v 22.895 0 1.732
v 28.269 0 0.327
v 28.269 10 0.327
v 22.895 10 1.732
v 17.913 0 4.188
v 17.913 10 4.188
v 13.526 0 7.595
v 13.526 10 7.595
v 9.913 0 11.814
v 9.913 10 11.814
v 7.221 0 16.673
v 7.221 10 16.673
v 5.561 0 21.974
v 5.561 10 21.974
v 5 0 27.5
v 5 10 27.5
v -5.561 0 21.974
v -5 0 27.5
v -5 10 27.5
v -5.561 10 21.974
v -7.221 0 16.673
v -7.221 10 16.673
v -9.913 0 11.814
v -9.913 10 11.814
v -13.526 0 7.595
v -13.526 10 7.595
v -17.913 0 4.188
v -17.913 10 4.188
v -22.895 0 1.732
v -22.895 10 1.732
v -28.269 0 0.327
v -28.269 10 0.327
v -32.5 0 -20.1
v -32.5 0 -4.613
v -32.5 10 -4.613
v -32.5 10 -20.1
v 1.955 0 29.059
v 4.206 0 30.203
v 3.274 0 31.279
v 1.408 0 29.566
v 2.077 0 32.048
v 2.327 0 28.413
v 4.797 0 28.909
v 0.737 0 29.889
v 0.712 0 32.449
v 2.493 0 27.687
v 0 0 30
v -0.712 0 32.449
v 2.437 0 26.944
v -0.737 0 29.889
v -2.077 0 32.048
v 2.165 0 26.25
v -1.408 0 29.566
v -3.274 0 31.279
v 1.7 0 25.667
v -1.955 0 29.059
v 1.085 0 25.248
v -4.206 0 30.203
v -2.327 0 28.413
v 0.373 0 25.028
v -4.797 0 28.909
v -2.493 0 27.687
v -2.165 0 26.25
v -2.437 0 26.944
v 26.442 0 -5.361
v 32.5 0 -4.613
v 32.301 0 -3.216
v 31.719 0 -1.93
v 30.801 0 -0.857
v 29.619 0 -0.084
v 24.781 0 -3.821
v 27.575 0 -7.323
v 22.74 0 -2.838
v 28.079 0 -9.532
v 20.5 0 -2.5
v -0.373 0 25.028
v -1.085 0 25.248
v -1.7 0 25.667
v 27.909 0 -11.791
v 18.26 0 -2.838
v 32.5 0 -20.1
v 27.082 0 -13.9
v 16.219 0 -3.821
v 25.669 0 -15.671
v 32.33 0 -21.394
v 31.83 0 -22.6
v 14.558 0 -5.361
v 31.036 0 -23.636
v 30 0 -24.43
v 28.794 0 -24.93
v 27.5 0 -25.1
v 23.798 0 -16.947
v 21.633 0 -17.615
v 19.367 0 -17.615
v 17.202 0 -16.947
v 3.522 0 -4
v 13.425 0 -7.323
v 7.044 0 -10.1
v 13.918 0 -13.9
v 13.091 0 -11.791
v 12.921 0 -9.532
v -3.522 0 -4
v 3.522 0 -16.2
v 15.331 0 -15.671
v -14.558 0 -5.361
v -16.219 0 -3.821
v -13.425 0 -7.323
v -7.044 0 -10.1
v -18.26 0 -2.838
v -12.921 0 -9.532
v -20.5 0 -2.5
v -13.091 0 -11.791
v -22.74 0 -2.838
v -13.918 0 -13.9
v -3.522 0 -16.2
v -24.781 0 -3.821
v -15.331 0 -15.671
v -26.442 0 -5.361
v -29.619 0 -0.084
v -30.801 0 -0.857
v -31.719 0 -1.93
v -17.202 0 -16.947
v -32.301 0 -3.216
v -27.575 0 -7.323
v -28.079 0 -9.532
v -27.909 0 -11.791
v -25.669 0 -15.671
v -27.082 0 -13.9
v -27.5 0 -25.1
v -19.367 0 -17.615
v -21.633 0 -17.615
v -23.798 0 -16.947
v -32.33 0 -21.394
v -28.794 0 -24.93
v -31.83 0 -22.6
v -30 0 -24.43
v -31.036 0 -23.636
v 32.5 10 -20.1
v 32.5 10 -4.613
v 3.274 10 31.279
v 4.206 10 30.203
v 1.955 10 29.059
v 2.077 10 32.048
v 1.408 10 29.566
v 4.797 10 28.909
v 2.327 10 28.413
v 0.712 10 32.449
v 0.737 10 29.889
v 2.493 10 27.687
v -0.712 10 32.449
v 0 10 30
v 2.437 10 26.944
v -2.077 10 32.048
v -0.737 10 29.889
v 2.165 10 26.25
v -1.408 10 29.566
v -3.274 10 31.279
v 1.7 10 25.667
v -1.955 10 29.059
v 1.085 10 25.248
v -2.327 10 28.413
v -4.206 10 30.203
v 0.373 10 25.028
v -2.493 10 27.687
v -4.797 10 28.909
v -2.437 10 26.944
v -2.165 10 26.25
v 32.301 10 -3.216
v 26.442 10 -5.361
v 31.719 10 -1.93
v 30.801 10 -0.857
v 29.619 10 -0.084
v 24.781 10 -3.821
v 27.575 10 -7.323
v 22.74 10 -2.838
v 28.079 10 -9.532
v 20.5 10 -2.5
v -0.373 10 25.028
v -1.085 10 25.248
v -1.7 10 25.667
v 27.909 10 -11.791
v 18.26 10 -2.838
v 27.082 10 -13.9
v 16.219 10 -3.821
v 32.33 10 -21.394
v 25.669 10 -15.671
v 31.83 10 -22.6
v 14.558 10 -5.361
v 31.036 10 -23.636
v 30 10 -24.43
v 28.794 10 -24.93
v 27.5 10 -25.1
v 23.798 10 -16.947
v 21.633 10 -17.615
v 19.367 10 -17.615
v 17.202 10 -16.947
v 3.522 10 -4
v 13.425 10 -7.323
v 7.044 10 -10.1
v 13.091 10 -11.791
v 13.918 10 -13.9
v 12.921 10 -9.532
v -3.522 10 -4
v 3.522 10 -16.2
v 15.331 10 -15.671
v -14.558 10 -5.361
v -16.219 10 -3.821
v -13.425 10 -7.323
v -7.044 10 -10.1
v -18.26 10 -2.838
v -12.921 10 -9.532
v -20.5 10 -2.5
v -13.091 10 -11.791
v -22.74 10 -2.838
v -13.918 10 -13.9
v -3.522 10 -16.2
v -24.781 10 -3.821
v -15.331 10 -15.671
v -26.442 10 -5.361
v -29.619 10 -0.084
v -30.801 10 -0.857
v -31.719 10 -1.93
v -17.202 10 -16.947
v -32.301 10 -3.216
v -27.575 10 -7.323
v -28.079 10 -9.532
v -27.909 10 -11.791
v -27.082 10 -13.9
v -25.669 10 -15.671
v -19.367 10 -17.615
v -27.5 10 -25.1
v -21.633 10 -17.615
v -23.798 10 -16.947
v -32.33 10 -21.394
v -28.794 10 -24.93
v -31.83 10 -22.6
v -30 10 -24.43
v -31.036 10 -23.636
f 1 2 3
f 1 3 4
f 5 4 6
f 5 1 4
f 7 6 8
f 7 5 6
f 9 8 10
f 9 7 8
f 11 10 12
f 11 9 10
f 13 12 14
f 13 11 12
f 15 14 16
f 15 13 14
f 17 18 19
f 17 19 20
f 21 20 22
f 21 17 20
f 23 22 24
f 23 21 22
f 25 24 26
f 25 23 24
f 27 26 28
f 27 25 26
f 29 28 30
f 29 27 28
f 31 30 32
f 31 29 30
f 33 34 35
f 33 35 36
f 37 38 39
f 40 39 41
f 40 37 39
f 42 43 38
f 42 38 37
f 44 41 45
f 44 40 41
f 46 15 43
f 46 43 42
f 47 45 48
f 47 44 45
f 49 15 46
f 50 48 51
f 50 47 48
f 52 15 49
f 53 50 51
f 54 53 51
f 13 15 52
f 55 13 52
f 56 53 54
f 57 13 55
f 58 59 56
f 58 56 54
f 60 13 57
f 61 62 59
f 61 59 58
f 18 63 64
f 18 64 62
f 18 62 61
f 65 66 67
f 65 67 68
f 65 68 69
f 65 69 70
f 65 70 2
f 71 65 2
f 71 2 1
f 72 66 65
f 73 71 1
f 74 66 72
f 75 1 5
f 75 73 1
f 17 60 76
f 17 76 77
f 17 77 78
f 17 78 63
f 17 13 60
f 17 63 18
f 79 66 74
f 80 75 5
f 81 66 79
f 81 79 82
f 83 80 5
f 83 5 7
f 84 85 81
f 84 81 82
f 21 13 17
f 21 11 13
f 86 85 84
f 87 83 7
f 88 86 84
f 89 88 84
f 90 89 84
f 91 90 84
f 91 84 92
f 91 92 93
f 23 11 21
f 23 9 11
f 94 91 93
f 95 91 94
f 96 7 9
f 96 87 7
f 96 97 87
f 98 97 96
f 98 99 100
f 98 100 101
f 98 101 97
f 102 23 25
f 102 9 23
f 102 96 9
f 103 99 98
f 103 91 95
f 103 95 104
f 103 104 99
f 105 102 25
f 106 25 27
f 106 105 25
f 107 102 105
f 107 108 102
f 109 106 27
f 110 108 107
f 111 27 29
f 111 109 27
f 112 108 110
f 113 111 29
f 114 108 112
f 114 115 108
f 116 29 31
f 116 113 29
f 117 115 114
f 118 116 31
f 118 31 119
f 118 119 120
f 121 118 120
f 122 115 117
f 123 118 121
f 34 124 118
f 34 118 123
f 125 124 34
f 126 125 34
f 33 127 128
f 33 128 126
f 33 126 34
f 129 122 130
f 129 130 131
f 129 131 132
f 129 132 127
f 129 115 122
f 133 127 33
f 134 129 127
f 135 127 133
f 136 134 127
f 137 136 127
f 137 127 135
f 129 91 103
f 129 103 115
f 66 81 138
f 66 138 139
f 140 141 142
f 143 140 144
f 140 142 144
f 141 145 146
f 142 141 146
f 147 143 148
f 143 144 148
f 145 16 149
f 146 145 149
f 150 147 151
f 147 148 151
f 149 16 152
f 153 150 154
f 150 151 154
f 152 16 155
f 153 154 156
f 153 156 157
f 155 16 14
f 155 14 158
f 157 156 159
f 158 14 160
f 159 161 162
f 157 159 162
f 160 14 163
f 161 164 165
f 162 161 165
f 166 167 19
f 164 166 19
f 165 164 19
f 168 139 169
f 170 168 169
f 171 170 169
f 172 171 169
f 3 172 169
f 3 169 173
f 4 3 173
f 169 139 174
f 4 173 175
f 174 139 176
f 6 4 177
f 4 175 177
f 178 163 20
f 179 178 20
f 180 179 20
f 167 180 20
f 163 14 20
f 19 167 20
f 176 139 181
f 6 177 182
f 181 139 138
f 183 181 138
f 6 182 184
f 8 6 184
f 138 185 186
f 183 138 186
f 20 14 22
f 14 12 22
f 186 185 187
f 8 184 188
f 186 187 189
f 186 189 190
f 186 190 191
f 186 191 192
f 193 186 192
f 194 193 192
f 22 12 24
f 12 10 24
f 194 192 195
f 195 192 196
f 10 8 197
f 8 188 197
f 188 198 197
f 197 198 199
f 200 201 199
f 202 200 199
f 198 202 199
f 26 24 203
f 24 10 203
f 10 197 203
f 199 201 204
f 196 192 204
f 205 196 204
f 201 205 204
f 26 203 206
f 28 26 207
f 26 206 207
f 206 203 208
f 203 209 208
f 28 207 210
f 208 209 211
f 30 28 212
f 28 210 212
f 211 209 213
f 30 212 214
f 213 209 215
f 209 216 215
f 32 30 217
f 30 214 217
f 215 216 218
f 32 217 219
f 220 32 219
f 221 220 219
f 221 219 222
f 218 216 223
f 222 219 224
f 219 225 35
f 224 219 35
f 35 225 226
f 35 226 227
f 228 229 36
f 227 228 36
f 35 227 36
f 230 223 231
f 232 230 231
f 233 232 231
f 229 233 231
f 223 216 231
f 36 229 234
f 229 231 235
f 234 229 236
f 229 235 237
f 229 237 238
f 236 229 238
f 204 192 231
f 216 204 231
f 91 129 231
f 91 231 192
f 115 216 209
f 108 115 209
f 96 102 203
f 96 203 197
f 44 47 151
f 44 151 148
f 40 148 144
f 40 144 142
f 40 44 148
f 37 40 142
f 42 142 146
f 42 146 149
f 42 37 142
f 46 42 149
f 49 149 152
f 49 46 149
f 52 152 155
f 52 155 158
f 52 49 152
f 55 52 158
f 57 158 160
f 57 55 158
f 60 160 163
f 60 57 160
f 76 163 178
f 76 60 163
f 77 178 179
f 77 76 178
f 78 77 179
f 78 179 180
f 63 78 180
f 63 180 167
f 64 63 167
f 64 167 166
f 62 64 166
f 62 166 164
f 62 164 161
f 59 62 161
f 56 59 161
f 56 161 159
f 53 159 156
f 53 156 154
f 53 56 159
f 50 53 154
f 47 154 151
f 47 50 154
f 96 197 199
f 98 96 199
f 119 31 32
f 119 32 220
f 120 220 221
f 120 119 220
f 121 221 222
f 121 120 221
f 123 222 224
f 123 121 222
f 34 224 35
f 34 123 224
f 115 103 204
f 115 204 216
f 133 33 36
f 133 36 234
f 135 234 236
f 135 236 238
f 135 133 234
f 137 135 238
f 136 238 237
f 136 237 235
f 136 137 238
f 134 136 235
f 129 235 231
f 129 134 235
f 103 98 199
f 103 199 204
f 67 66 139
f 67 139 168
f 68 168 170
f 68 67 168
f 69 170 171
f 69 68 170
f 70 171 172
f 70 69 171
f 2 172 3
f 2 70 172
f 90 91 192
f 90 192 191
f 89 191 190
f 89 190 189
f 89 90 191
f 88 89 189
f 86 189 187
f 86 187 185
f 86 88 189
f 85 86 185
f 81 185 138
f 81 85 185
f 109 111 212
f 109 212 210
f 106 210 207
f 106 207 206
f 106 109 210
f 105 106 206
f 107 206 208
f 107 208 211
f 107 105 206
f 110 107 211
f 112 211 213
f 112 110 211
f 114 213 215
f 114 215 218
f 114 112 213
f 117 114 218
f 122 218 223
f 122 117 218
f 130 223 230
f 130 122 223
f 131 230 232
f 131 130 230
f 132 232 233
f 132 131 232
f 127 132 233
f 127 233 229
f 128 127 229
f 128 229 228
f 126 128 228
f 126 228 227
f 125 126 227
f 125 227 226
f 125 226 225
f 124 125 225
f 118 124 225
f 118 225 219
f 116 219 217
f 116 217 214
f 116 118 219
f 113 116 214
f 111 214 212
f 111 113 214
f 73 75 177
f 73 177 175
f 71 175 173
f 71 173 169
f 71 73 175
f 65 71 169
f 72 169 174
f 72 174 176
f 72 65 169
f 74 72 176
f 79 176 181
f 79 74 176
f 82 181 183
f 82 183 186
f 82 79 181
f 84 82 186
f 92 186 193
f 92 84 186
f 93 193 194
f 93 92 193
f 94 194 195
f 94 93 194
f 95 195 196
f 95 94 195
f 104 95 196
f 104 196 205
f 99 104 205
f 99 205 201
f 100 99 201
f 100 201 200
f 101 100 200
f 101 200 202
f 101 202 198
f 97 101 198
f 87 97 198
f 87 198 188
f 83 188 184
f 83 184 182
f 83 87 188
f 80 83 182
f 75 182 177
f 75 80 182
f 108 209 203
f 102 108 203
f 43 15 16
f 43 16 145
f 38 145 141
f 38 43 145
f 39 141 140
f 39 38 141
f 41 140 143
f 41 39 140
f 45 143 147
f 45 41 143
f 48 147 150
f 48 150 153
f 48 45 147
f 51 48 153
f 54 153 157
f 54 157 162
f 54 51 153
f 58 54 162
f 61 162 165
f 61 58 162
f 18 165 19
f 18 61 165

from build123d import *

# Parameters (mm, degrees)
SKETCH1_R           = 7.6
SKETCH1_R_2         = 2.5
BOSS_EXTRUDE1_DEPTH = 10


with BuildPart() as part:
    # Sketch1 → Boss-Extrude1 (new body)
    with BuildSketch(Plane(origin=(0, 0, 0), x_dir=(1, 0, 0), z_dir=(0, 1, 0))):
        with BuildLine():
            Line((-27.5, 25.1), (27.5, 25.1))
            ThreePointArc((27.5, 25.1), (31.035533906, 23.635533906), (32.5, 20.1))
            Line((32.5, 20.1), (32.5, 4.613081447))
            ThreePointArc((32.5, 4.613081447), (31.297772627, 1.360863269), (28.269230769, -0.327392622))
            ThreePointArc((28.269230769, -0.327392622), (11.612250554, -9.612800021), (5, -27.5))
            ThreePointArc((5, -27.5), (0, -32.5), (-5, -27.5))
            ThreePointArc((-5, -27.5), (-11.612250554, -9.612800021), (-28.269230769, -0.327392622))
            ThreePointArc((-28.269230769, -0.327392622), (-31.297772627, 1.360863269), (-32.5, 4.613081447))
            Line((-32.5, 4.613081447), (-32.5, 20.1))
            ThreePointArc((-32.5, 20.1), (-31.035533906, 23.635533906), (-27.5, 25.1))
        make_face()
        with Locations(Location((-20.5, 10.1, 0), (0, 0, 270))):  # turned: the seam where the file's is
            Circle(SKETCH1_R, mode=Mode.SUBTRACT)
        with Locations(Location((20.5, 10.1, 0), (0, 0, 270))):  # turned: the seam where the file's is
            Circle(SKETCH1_R, mode=Mode.SUBTRACT)
        with Locations(Location((0, -27.5, 0), (0, 0, 270))):  # turned: the seam where the file's is
            Circle(SKETCH1_R_2, mode=Mode.SUBTRACT)
        Polygon((7.043673284, 10.1), (3.521836642, 16.2), (-3.521836642, 16.2), (-7.043673284, 10.1), (-3.521836642, 4), (3.521836642, 4), align=None, mode=Mode.SUBTRACT)
    extrude(amount=BOSS_EXTRUDE1_DEPTH)


solid = part.part
